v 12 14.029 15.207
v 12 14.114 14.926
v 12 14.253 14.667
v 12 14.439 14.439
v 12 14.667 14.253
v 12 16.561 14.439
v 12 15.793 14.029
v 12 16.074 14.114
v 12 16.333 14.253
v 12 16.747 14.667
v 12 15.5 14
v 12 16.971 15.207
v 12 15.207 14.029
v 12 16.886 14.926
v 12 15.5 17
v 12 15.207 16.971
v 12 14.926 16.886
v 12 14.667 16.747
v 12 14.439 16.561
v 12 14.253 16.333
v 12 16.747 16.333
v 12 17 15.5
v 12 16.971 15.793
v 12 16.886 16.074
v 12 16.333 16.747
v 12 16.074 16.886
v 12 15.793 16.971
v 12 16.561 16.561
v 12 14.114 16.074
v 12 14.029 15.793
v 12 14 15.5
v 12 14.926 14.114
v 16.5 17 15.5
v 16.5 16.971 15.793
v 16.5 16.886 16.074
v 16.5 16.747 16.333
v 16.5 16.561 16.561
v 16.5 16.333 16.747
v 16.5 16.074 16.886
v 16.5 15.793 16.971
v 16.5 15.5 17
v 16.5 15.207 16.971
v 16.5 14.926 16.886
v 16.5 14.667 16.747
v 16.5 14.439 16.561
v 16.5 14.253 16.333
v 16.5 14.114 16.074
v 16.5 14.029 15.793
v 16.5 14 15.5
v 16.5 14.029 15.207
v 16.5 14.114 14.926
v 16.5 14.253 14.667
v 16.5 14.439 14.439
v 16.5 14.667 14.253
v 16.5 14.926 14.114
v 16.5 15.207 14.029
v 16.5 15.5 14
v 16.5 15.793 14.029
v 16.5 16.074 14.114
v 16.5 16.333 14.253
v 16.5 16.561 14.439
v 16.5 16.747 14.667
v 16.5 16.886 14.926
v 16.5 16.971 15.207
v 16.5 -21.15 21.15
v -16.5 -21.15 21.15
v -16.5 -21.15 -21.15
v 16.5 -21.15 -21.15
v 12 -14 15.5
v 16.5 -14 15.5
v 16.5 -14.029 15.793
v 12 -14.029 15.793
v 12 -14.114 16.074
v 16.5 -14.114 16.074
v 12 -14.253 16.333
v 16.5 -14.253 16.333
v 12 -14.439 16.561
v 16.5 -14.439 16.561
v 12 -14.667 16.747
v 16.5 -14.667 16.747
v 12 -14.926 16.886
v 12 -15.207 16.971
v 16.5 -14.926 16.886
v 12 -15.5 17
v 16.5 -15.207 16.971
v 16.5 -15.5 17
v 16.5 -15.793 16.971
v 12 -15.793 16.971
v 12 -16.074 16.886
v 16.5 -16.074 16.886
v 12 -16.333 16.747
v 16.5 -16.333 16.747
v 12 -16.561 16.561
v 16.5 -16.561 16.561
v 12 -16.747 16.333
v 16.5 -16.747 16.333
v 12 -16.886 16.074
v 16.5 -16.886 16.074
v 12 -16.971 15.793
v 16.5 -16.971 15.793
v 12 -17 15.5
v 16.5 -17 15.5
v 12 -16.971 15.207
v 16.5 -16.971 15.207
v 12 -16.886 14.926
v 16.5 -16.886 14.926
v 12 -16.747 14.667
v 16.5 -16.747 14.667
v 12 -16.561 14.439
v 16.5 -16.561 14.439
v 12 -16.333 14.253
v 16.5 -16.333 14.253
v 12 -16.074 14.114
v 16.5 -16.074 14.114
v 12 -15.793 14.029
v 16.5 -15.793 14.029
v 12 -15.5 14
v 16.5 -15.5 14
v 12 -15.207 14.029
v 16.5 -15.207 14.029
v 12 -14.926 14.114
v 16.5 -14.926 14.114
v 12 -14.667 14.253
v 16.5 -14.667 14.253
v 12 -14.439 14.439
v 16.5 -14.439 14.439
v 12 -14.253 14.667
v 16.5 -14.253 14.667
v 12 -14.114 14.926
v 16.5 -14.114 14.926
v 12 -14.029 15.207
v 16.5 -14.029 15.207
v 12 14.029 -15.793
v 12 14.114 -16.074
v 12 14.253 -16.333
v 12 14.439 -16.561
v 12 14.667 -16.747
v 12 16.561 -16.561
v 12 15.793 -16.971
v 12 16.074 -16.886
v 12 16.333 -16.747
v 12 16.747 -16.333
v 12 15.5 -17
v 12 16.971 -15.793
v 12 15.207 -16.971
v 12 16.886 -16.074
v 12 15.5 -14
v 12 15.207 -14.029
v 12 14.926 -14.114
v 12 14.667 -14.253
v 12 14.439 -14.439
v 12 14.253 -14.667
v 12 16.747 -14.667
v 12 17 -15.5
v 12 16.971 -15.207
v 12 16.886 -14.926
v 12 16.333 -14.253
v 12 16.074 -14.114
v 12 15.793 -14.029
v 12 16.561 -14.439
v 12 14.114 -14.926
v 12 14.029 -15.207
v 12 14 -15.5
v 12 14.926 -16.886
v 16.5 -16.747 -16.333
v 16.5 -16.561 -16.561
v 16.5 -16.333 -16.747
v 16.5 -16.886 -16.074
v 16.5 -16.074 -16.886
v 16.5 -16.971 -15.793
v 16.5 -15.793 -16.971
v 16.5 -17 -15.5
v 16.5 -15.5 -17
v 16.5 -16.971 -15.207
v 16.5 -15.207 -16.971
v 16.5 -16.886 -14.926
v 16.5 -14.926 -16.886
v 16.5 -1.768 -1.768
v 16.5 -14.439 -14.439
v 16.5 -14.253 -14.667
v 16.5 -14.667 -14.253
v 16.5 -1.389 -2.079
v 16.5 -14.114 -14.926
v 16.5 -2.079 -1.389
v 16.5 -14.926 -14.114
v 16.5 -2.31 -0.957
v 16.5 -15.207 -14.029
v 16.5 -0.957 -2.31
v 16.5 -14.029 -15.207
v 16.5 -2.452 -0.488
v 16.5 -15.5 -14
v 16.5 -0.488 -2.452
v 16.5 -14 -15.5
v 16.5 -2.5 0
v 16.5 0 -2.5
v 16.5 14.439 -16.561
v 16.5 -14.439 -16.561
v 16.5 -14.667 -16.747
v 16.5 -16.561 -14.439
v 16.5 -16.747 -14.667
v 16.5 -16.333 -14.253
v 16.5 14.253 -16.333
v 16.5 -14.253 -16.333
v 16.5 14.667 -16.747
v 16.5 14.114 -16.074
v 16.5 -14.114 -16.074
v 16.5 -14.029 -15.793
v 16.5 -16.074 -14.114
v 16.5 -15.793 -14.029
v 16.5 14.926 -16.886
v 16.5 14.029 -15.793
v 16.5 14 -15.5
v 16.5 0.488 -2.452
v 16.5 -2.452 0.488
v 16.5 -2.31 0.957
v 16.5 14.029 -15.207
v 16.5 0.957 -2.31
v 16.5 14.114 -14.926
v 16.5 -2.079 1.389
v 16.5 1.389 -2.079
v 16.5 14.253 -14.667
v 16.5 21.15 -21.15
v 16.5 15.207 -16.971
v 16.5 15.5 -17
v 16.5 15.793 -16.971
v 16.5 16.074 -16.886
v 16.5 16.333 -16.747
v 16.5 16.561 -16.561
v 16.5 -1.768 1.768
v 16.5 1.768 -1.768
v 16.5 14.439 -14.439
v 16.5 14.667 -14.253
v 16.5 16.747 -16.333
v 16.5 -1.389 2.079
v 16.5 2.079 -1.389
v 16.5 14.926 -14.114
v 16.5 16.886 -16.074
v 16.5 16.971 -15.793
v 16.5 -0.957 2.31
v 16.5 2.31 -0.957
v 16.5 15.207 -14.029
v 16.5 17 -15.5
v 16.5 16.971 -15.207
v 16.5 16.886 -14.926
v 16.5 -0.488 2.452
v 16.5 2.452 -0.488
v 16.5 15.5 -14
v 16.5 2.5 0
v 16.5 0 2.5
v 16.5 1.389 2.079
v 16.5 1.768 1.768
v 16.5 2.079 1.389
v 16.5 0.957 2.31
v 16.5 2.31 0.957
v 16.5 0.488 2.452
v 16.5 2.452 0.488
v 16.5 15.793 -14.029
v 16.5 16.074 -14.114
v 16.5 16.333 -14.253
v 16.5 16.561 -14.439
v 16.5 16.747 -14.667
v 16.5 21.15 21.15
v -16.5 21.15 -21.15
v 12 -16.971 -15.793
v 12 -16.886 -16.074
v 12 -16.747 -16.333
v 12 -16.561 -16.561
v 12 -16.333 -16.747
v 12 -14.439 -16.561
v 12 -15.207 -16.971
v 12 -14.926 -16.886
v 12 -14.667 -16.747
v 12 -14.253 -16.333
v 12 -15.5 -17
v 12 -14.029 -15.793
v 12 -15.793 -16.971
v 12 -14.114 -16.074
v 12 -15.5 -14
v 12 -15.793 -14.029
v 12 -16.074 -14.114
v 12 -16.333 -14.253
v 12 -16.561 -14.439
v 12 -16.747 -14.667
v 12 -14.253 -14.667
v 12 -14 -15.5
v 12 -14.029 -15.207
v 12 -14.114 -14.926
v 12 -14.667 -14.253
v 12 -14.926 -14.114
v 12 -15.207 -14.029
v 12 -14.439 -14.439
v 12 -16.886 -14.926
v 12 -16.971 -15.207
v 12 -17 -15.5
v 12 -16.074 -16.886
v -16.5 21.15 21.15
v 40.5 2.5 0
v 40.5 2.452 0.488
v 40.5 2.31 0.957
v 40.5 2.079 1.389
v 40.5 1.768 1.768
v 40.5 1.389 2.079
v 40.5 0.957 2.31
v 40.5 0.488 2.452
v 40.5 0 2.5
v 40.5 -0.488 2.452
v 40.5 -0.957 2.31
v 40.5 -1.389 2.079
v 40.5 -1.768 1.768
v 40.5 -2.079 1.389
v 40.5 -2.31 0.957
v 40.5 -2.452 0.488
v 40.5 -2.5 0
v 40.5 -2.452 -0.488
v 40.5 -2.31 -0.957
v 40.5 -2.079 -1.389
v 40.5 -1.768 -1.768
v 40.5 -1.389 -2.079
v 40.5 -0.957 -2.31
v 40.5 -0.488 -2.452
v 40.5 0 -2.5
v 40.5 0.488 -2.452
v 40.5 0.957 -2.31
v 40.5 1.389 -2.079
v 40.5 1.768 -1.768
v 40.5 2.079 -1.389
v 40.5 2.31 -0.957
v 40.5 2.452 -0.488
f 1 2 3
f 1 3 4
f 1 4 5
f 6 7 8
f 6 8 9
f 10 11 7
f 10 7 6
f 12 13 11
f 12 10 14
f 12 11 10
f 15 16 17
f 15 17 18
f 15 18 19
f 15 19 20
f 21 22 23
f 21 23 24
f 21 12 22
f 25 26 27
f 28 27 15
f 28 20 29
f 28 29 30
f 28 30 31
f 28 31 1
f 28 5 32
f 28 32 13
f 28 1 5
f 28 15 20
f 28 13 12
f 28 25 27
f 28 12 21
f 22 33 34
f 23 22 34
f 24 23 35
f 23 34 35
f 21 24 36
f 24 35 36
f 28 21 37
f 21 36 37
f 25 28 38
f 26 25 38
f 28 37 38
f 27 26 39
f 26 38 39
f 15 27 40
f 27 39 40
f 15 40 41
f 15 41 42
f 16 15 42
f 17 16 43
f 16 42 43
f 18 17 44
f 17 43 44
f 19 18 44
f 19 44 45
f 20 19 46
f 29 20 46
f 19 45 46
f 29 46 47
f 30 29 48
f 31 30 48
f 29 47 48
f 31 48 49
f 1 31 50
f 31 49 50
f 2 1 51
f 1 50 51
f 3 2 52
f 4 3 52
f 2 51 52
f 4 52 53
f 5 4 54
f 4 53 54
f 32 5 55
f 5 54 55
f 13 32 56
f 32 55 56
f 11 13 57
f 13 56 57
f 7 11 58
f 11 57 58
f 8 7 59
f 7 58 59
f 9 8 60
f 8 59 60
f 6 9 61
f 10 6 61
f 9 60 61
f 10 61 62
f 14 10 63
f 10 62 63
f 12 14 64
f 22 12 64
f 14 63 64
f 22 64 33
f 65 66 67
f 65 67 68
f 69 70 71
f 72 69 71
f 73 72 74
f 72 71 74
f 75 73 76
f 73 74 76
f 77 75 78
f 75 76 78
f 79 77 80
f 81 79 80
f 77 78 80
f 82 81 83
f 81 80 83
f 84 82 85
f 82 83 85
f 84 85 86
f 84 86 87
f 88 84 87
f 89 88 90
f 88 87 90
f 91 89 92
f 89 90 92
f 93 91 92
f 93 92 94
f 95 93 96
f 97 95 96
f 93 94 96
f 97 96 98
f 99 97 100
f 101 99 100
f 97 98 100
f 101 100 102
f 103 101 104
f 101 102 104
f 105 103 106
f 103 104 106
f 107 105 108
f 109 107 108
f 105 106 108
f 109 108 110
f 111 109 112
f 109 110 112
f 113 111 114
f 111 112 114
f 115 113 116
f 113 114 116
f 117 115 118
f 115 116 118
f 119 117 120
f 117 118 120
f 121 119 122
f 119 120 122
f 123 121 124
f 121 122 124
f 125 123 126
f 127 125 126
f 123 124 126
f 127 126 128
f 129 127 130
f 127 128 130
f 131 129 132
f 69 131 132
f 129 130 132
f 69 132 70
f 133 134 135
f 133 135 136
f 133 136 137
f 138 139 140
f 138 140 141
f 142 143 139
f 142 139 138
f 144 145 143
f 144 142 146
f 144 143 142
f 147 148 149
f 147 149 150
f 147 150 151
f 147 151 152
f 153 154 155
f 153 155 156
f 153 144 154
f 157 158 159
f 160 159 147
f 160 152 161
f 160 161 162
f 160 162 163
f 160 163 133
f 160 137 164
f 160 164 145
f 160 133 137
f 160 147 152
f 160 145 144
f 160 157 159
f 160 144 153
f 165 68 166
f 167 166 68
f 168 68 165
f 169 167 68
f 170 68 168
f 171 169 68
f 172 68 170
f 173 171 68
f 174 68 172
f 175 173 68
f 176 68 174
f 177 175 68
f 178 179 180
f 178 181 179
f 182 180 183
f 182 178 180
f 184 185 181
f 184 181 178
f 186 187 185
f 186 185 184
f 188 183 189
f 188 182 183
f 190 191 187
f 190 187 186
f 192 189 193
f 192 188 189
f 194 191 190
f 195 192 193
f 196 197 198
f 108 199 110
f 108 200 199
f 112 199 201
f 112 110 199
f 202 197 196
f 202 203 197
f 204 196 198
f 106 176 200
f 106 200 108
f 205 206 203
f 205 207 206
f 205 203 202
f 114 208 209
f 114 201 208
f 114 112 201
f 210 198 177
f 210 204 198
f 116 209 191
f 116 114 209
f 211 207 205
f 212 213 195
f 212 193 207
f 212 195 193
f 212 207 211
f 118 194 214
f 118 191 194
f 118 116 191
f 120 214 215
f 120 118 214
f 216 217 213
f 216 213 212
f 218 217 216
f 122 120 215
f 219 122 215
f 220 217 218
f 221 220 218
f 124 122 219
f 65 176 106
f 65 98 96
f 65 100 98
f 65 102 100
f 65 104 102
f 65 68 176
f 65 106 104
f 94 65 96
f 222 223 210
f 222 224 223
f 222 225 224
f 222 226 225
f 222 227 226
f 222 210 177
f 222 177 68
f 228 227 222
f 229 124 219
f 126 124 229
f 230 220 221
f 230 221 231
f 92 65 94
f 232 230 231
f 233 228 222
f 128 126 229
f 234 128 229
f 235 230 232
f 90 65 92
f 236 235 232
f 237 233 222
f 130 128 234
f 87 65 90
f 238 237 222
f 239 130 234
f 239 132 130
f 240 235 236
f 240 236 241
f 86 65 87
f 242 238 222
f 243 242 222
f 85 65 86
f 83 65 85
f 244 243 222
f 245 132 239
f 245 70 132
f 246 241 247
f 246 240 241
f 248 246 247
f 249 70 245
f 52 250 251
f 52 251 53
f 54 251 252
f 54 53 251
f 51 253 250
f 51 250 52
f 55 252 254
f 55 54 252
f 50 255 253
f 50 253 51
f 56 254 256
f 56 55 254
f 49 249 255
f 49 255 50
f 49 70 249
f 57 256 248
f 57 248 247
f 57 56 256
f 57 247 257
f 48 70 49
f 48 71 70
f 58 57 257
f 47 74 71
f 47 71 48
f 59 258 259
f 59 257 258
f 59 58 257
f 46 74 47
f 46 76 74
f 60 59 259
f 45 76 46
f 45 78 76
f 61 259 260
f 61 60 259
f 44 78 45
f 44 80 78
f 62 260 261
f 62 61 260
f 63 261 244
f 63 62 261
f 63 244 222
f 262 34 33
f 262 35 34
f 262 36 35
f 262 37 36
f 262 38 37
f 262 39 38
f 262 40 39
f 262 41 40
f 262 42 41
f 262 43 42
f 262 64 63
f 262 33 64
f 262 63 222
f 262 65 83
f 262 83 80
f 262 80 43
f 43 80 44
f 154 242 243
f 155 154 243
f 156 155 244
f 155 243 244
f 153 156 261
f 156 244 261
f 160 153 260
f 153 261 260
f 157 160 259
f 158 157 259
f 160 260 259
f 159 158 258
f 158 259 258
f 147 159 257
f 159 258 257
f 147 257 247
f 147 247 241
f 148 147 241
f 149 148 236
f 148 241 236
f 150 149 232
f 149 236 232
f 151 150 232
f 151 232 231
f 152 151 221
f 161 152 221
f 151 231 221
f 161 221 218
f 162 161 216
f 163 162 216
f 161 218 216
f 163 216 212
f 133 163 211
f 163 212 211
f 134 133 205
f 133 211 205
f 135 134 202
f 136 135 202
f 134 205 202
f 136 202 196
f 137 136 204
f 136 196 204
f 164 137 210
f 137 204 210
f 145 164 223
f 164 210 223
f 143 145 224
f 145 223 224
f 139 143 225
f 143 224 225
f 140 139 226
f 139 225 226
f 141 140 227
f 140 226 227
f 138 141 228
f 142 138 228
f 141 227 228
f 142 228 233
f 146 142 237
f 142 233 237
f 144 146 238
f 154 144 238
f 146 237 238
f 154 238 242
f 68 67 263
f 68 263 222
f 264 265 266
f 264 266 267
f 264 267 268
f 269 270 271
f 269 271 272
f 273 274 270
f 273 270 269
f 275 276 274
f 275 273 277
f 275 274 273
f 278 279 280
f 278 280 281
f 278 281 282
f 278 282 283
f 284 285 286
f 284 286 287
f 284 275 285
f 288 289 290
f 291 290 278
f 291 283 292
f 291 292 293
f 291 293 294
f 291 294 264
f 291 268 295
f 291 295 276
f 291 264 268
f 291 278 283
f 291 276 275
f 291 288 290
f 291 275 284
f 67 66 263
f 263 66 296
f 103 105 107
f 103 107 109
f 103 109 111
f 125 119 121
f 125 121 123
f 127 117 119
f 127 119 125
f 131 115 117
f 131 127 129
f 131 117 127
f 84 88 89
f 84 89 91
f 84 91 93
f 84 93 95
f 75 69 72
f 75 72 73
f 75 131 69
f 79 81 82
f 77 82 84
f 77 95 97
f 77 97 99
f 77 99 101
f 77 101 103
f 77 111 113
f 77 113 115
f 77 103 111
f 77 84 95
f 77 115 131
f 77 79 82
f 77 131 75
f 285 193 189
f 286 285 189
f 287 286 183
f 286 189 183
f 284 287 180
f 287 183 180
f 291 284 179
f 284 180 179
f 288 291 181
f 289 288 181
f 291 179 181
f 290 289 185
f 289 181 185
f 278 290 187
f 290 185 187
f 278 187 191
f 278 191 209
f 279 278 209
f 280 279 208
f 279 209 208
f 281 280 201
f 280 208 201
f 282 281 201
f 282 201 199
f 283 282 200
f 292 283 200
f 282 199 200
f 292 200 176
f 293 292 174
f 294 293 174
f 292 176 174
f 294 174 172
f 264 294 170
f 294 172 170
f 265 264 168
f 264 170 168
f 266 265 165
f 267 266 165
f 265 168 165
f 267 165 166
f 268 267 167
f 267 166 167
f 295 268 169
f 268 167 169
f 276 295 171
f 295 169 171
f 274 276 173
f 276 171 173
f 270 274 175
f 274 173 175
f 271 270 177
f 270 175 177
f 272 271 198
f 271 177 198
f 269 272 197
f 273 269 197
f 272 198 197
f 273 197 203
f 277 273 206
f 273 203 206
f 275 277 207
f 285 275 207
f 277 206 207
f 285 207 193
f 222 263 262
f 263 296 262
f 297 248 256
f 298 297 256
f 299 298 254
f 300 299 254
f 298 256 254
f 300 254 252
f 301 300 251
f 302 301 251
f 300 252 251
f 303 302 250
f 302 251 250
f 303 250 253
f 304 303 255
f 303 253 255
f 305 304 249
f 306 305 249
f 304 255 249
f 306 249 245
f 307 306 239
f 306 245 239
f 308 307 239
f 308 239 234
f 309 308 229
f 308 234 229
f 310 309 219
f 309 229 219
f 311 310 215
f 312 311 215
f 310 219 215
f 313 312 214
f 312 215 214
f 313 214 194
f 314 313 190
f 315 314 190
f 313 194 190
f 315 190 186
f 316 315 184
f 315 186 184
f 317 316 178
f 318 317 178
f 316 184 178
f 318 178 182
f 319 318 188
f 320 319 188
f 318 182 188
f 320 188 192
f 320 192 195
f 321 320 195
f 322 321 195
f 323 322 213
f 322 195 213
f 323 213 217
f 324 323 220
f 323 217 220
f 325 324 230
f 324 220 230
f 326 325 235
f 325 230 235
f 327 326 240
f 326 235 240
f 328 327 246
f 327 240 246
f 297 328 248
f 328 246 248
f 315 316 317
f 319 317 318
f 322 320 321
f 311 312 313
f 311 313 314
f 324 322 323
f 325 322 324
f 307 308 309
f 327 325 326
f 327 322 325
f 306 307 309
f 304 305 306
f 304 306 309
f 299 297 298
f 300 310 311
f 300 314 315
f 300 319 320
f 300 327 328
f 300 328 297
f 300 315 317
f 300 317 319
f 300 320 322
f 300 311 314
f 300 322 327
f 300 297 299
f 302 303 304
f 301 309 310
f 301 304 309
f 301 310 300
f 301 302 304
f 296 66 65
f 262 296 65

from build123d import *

# Parameters (mm, degrees)
SKETCH_W     = 33
SKETCH_H     = 42.3
PAD_DEPTH    = 21.15
SKETCH001_R  = 2.5
PAD001_DEPTH = 24
SKETCH002_R  = 1.5
POCKET_DEPTH = 4.5


with BuildPart() as part:
    # Sketch → Pad (new body, symmetric)
    with BuildSketch(Plane.XY):
        Rectangle(SKETCH_W, SKETCH_H)
    extrude(amount=PAD_DEPTH, both=True)

    # Sketch001 (on Face1 of Pad) → Pad001 (join)
    with BuildSketch(Plane.YZ.offset(16.5)):
        Circle(SKETCH001_R)
    extrude(amount=PAD001_DEPTH)

    # Sketch002 (on Face1 of Pad001) → Pocket (cut)
    with BuildSketch(Plane.YZ.offset(16.5)):
        with Locations((-15.5, 15.5)):
            Circle(SKETCH002_R)
        with Locations((15.5, 15.5)):
            Circle(SKETCH002_R)
        with Locations((15.5, -15.5)):
            Circle(SKETCH002_R)
        with Locations((-15.5, -15.5)):
            Circle(SKETCH002_R)
    extrude(amount=-POCKET_DEPTH, mode=Mode.SUBTRACT)


solid = part.part
